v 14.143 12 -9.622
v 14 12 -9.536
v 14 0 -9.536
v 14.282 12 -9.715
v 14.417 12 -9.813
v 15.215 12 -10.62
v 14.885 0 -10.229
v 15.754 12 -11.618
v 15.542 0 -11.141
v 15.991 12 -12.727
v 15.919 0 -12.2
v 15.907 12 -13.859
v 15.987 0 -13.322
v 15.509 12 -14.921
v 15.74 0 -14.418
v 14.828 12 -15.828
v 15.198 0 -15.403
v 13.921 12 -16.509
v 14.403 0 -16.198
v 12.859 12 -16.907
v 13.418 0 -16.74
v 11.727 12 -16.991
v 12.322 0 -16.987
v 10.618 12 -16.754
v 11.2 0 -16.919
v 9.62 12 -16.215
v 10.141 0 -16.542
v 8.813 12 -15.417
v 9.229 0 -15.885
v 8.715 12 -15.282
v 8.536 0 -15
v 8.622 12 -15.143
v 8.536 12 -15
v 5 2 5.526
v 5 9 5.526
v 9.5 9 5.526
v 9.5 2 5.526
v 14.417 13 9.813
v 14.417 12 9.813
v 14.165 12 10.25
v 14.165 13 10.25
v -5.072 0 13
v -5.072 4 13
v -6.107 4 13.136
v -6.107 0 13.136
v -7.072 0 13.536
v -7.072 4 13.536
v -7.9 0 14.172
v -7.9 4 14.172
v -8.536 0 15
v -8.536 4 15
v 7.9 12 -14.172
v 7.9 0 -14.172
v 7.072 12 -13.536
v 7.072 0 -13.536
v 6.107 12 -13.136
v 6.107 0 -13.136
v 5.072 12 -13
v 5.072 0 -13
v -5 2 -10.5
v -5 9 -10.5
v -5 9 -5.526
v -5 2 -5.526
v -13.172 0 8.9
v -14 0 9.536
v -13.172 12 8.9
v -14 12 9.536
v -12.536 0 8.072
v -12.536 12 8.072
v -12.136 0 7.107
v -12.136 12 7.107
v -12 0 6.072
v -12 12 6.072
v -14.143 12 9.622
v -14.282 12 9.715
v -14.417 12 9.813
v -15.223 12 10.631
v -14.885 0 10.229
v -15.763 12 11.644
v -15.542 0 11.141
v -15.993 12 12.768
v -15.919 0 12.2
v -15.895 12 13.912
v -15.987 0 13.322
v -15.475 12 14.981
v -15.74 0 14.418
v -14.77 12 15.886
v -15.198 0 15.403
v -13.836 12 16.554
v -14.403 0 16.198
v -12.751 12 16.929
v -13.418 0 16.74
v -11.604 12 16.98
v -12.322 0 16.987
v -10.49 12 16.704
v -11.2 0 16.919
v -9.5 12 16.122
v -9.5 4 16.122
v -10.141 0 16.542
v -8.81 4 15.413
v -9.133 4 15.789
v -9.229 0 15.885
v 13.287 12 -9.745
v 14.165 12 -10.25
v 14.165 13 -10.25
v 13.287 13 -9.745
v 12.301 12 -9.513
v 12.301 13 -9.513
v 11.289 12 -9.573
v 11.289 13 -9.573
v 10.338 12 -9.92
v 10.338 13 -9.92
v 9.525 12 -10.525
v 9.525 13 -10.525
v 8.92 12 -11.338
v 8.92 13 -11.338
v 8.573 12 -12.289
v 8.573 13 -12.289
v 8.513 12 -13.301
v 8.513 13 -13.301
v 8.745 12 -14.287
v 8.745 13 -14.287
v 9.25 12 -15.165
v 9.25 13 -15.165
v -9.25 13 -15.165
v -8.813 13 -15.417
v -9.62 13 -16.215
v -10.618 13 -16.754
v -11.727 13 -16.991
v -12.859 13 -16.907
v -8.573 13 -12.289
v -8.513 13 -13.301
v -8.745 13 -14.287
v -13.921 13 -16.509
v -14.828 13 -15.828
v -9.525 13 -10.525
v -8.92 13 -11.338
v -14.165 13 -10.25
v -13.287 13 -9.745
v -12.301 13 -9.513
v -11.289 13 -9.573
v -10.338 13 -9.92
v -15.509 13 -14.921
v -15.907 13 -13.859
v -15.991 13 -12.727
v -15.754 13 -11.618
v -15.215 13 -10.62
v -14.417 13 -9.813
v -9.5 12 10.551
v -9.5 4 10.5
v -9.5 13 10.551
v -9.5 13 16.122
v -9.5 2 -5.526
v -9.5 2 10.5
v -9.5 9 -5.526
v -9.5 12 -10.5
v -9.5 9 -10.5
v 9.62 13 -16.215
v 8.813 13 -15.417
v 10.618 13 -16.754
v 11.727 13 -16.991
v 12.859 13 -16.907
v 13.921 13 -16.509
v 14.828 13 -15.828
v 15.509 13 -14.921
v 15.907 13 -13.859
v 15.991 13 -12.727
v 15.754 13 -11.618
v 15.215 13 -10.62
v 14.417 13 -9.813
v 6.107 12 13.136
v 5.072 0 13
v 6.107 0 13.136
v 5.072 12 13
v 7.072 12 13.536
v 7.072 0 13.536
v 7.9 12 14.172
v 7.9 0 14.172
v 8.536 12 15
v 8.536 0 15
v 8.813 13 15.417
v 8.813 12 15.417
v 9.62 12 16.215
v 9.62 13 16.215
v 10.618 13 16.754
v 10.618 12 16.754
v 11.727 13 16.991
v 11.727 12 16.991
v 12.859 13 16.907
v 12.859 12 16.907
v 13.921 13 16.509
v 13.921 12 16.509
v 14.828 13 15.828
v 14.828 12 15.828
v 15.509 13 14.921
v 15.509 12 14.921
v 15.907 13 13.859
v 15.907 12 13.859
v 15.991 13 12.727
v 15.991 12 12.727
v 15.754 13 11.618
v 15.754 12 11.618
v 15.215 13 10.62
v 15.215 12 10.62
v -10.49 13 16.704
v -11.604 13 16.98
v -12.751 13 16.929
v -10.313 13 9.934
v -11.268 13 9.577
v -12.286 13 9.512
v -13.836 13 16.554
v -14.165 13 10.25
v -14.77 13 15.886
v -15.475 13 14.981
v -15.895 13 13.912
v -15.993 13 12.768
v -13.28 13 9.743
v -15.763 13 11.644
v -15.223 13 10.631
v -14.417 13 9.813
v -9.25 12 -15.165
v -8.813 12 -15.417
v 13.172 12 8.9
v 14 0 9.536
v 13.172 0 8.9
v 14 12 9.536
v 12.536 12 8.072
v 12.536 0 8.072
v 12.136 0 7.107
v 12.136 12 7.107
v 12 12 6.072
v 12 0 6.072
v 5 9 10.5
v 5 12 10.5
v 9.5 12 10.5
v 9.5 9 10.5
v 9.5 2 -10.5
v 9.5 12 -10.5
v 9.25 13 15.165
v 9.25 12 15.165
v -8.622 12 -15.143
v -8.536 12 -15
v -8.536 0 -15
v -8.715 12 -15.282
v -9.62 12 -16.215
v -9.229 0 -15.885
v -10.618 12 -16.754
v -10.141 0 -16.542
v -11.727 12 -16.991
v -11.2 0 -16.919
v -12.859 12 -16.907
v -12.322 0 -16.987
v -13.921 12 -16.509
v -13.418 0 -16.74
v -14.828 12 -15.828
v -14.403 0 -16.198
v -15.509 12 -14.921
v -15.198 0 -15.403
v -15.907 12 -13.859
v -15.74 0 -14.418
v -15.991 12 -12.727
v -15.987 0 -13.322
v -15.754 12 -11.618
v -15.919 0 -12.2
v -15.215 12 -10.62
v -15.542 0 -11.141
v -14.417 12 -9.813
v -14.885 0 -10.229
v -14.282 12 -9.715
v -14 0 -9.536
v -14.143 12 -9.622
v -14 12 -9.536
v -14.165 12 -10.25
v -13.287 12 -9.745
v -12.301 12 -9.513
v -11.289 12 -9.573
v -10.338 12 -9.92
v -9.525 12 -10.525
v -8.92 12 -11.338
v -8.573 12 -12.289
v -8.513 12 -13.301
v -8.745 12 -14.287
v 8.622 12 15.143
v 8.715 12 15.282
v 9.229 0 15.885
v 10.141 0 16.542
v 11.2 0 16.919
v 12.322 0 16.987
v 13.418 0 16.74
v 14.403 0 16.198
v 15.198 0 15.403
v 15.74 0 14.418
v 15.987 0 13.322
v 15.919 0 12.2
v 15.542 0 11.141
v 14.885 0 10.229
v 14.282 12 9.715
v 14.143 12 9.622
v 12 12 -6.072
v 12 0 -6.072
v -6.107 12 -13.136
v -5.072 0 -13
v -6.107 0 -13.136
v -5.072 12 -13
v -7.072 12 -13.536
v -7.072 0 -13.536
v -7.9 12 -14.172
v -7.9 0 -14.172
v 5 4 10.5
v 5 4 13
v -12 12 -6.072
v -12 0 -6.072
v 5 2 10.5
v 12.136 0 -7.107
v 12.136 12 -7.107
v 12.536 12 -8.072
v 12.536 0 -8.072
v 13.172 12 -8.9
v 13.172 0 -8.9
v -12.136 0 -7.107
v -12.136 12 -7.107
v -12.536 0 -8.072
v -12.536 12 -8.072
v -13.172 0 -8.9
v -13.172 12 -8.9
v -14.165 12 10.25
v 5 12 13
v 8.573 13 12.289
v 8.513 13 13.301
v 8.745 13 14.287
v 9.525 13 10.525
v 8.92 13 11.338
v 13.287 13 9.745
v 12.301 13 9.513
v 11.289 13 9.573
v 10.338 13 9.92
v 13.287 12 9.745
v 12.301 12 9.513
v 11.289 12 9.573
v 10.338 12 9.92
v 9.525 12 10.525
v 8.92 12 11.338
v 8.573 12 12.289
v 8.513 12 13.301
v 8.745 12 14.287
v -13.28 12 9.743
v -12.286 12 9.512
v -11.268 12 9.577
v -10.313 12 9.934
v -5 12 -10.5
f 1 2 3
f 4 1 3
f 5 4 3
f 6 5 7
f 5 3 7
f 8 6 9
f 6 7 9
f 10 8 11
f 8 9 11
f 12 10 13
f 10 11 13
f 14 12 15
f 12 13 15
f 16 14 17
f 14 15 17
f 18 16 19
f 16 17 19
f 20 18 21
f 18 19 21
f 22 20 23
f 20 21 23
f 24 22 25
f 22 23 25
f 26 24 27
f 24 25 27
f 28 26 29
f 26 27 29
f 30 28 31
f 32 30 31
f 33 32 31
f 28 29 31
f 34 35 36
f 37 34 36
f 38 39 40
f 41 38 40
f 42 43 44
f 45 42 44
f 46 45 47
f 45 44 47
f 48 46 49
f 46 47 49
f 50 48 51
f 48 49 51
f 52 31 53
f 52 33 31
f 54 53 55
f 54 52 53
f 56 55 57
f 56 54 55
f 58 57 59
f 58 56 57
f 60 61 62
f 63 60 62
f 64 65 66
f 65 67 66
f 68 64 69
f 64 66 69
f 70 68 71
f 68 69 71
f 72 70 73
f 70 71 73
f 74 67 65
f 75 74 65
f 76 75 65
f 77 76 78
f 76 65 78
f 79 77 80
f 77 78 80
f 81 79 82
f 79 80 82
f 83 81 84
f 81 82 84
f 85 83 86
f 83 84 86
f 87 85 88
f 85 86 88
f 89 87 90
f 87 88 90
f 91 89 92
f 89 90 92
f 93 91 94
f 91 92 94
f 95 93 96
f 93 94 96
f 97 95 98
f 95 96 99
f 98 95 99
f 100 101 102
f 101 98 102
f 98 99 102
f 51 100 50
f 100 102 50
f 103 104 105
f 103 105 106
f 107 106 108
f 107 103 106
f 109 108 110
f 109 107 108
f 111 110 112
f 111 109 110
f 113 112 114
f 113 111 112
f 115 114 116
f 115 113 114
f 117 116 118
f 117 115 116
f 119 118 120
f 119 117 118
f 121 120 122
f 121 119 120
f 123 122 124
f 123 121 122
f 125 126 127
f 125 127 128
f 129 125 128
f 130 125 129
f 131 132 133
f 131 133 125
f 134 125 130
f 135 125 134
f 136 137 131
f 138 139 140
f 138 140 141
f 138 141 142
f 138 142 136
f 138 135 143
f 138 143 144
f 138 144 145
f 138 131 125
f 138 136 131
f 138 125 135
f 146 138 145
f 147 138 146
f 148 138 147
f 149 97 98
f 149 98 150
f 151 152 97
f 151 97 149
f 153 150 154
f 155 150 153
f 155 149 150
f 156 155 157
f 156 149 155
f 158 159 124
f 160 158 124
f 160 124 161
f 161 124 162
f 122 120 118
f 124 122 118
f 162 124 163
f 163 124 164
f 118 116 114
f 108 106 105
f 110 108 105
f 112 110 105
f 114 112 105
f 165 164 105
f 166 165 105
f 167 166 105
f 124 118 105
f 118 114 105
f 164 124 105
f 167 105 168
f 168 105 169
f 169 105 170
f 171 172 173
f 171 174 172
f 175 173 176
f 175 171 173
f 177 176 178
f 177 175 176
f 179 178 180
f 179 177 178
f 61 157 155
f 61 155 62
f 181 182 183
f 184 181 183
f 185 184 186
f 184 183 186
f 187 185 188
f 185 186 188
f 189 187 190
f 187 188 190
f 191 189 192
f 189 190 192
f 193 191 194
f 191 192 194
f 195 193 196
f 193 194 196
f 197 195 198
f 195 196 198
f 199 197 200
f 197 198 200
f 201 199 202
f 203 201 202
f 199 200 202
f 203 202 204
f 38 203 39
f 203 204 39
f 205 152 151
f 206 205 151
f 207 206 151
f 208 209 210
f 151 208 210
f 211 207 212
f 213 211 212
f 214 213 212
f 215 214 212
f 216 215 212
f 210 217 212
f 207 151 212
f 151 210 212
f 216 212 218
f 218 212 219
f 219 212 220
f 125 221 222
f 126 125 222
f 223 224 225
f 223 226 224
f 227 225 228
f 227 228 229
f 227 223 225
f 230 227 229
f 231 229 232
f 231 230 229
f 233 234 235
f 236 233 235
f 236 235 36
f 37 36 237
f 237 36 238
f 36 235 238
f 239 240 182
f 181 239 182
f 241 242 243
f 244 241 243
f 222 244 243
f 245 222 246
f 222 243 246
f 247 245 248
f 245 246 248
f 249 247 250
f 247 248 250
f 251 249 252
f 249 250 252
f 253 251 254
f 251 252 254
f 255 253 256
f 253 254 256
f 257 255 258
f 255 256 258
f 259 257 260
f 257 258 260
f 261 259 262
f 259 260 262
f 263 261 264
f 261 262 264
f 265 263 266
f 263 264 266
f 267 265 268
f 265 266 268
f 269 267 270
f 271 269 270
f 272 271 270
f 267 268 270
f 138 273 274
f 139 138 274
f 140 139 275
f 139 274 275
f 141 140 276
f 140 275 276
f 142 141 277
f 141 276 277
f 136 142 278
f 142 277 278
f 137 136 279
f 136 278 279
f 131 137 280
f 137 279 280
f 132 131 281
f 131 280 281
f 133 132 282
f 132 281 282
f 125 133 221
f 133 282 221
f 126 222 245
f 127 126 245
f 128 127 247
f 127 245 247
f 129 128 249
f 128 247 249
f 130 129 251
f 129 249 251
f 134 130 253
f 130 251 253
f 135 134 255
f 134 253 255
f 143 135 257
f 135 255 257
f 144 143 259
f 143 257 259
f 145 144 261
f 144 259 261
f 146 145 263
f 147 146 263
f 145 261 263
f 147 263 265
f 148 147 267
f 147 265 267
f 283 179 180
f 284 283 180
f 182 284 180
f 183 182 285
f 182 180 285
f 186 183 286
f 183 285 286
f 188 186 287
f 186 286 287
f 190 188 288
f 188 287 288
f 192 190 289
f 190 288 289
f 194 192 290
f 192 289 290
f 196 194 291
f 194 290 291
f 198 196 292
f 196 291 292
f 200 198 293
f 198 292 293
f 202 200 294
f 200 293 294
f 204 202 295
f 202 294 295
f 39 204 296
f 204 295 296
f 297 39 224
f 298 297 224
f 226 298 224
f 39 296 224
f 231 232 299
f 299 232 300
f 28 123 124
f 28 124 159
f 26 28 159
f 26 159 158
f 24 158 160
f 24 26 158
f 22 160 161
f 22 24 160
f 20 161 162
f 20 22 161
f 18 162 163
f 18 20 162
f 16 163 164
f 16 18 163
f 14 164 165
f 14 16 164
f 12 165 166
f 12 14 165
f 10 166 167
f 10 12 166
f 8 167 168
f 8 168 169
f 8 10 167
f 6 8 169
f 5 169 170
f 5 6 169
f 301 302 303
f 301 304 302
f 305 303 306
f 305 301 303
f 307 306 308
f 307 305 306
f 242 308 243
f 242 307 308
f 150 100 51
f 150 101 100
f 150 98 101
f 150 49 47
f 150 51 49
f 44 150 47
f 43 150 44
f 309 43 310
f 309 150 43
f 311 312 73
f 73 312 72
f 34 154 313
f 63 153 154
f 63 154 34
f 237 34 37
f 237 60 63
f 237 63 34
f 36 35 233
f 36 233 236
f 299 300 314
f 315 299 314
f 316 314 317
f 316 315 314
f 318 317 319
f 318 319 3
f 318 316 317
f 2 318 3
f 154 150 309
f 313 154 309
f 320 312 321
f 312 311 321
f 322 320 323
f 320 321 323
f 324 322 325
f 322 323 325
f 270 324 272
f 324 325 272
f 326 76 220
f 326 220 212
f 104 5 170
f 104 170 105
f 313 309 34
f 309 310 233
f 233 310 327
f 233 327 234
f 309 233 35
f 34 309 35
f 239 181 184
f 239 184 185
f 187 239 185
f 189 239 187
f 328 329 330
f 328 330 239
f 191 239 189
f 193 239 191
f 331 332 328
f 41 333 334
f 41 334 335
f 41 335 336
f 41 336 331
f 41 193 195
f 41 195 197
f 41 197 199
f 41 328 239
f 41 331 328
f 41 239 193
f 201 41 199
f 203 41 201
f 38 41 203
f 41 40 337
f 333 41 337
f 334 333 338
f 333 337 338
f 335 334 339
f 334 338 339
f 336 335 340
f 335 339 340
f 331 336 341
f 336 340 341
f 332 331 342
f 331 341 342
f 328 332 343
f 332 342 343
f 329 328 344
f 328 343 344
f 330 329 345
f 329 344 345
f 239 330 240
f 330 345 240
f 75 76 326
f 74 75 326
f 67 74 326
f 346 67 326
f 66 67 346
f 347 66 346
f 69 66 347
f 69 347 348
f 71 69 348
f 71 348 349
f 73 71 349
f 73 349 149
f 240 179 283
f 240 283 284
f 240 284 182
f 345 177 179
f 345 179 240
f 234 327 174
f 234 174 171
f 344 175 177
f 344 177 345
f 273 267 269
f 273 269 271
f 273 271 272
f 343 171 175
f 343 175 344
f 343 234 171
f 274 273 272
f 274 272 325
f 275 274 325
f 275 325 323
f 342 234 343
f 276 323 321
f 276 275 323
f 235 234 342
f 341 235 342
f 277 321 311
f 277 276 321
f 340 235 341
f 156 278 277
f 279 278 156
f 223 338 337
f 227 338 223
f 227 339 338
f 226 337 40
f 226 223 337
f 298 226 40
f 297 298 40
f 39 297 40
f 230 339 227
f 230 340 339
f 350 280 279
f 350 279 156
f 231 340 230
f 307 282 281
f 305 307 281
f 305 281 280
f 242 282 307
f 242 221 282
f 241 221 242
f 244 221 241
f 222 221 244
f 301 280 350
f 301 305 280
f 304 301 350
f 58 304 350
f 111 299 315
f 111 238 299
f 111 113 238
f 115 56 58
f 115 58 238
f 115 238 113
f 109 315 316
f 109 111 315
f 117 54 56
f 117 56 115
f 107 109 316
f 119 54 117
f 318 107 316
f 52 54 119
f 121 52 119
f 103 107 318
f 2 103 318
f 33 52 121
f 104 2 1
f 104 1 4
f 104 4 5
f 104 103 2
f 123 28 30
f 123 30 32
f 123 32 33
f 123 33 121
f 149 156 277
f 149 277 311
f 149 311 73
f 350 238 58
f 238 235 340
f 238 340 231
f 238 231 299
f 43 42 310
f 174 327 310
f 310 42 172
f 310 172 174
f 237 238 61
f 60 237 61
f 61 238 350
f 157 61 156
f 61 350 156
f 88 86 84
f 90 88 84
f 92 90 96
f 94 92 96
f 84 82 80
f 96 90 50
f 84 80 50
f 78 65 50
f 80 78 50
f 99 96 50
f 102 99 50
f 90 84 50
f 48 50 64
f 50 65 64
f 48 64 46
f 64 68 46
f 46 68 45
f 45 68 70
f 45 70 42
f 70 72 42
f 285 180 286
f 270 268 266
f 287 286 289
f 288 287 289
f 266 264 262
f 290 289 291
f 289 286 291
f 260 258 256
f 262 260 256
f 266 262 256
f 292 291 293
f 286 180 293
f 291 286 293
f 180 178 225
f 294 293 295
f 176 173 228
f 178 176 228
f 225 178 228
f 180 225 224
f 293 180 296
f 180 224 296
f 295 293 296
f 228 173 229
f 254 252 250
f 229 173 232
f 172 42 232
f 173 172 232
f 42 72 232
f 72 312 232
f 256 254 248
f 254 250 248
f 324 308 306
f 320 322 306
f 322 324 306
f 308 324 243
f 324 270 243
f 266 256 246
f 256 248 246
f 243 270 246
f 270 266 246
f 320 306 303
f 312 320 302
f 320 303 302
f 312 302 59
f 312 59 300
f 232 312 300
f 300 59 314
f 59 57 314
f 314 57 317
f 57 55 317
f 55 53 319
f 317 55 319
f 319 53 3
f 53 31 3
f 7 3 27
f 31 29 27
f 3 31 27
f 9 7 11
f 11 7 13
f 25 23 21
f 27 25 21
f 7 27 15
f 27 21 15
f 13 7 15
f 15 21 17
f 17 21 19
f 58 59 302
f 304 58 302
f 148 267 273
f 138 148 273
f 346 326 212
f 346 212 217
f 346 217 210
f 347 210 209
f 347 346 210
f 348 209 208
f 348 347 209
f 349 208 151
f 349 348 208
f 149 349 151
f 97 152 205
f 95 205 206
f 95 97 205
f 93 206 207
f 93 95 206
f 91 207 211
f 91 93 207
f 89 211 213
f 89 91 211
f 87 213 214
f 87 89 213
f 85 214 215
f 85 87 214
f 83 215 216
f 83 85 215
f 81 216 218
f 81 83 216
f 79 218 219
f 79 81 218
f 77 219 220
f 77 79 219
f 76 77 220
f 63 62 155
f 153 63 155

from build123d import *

# Parameters (mm, degrees)
BOSS_EXTRUDE1_DEPTH     = 12
CUT_EXTRUDE1_DEPTH      = 10
FILLET1_R               = 4
BOSS_EXTRUDE3_DEPTH     = 1
MIRROR2_COPY_1_DEPTH    = 1
SKETCH3_W               = 14.5
SKETCH3_H               = 5.622498999
CUT_EXTRUDE2_DEPTH      = 2
CUT_EXTRUDE2_DEPTH_BACK = 8
SKETCH4_W               = 4.5
SKETCH4_H               = 4.973684211
CUT_EXTRUDE3_DEPTH      = 3


with BuildPart() as part:
    # Sketch1 → Boss-Extrude1 (new body)
    with BuildSketch(Plane(origin=(0, 0, 0), x_dir=(1, 0, 0), z_dir=(0, 1, 0))):
        with BuildLine():
            Line((-8, -13), (8, -13))
            ThreePointArc((8, -13), (14.828427125, -15.828427125), (12, -9))
            Line((12, -9), (12, 9))
            ThreePointArc((12, 9), (14.828427125, 15.828427125), (8, 13))
            Line((8, 13), (-8, 13))
            ThreePointArc((-8, 13), (-14.828427125, 15.828427125), (-12, 9))
            Line((-12, 9), (-12, -9))
            ThreePointArc((-12, -9), (-14.828427125, -15.828427125), (-8, -13))
        make_face()
    extrude(amount=BOSS_EXTRUDE1_DEPTH)

    # Sketch2 → Cut-Extrude1 (cut)
    with BuildSketch(Plane(origin=(0, 12, 0), x_dir=(1, 0, 0), z_dir=(0, 1, 0))):
        Polygon((-9.5, -10.5), (5, -10.5), (5, -5.526315789), (9.5, -5.526315789), (9.5, 10.5), (-5, 10.5), (-5, 5.526315789), (-9.5, 5.526315789), align=None)
    extrude(amount=-CUT_EXTRUDE1_DEPTH, mode=Mode.SUBTRACT)

    # Fillet1
    fillet1_edges = [part.edges().sort_by_distance(p)[0] for p in [
        (12, 6, -9),
        (12, 6, 9),
        (8, 6, 13),
        (-8, 6, 13),
        (-12, 6, 9),
        (-12, 6, -9),
        (-8, 6, -13),
        (8, 6, -13),
    ]]
    fillet(fillet1_edges, radius=FILLET1_R)

    # Sketch10 → Boss-Extrude3 (add)
    with BuildSketch(Plane(origin=(0, 12, 0), x_dir=(1, 0, 0), z_dir=(0, 1, 0))):
        with BuildLine():
            Line((14.417326185, -9.813068229), (14.165063509, -10.25))
            ThreePointArc((14.165063509, -10.25), (9.525126266, -10.525126266), (9.25, -15.165063509))
            Line((9.25, -15.165063509), (8.813068229, -15.417326185))
            ThreePointArc((8.813068229, -15.417326185), (14.828427125, -15.828427125), (14.417326185, -9.813068229))
        make_face()
    boss_extrude3 = extrude(amount=BOSS_EXTRUDE3_DEPTH)

    # Mirror1: Boss-Extrude3 across plane
    add(boss_extrude3.mirror(Plane(origin=(0, 0, 0), x_dir=(0, 0, 1), z_dir=(1, 0, 0))))

    # Mirror2: Boss-Extrude3 across plane
    add(boss_extrude3.mirror(Plane.XY))

    # Mirror2 copy 1 sketch → Mirror2 copy 1 (add)
    with BuildSketch(Plane(origin=(0, 12, 0), x_dir=(-1, 0, 0), z_dir=(0, 1, 0))):
        with BuildLine():
            Line((14.417326185, -9.813068229), (14.165063509, -10.25))
            ThreePointArc((14.165063509, -10.25), (9.525126266, -10.525126266), (9.25, -15.165063509))
            Line((9.25, -15.165063509), (8.813068229, -15.417326185))
            ThreePointArc((8.813068229, -15.417326185), (14.828427125, -15.828427125), (14.417326185, -9.813068229))
        make_face()
    extrude(amount=MIRROR2_COPY_1_DEPTH)

    # Sketch3 → Cut-Extrude2 (cut, two sides)
    with BuildSketch(Plane(origin=(0, 12, 0), x_dir=(1, 0, 0), z_dir=(0, 1, 0))) as cut_extrude2_sk:
        with Locations((-2.25, -13.3112495)):
            Rectangle(SKETCH3_W, SKETCH3_H)
    extrude(amount=CUT_EXTRUDE2_DEPTH, mode=Mode.SUBTRACT)
    extrude(cut_extrude2_sk.sketch, amount=-CUT_EXTRUDE2_DEPTH_BACK, mode=Mode.SUBTRACT)

    # Sketch4 → Cut-Extrude3 (cut)
    with BuildSketch(Plane(origin=(0, 12, 0), x_dir=(1, 0, 0), z_dir=(0, 1, 0))):
        with Locations((-7.25, 8.013157895)):
            Rectangle(SKETCH4_W, SKETCH4_H)
        with Locations((7.25, -8.013157895)):
            Rectangle(SKETCH4_W, SKETCH4_H)
    extrude(amount=-CUT_EXTRUDE3_DEPTH, mode=Mode.SUBTRACT)


solid = part.part
